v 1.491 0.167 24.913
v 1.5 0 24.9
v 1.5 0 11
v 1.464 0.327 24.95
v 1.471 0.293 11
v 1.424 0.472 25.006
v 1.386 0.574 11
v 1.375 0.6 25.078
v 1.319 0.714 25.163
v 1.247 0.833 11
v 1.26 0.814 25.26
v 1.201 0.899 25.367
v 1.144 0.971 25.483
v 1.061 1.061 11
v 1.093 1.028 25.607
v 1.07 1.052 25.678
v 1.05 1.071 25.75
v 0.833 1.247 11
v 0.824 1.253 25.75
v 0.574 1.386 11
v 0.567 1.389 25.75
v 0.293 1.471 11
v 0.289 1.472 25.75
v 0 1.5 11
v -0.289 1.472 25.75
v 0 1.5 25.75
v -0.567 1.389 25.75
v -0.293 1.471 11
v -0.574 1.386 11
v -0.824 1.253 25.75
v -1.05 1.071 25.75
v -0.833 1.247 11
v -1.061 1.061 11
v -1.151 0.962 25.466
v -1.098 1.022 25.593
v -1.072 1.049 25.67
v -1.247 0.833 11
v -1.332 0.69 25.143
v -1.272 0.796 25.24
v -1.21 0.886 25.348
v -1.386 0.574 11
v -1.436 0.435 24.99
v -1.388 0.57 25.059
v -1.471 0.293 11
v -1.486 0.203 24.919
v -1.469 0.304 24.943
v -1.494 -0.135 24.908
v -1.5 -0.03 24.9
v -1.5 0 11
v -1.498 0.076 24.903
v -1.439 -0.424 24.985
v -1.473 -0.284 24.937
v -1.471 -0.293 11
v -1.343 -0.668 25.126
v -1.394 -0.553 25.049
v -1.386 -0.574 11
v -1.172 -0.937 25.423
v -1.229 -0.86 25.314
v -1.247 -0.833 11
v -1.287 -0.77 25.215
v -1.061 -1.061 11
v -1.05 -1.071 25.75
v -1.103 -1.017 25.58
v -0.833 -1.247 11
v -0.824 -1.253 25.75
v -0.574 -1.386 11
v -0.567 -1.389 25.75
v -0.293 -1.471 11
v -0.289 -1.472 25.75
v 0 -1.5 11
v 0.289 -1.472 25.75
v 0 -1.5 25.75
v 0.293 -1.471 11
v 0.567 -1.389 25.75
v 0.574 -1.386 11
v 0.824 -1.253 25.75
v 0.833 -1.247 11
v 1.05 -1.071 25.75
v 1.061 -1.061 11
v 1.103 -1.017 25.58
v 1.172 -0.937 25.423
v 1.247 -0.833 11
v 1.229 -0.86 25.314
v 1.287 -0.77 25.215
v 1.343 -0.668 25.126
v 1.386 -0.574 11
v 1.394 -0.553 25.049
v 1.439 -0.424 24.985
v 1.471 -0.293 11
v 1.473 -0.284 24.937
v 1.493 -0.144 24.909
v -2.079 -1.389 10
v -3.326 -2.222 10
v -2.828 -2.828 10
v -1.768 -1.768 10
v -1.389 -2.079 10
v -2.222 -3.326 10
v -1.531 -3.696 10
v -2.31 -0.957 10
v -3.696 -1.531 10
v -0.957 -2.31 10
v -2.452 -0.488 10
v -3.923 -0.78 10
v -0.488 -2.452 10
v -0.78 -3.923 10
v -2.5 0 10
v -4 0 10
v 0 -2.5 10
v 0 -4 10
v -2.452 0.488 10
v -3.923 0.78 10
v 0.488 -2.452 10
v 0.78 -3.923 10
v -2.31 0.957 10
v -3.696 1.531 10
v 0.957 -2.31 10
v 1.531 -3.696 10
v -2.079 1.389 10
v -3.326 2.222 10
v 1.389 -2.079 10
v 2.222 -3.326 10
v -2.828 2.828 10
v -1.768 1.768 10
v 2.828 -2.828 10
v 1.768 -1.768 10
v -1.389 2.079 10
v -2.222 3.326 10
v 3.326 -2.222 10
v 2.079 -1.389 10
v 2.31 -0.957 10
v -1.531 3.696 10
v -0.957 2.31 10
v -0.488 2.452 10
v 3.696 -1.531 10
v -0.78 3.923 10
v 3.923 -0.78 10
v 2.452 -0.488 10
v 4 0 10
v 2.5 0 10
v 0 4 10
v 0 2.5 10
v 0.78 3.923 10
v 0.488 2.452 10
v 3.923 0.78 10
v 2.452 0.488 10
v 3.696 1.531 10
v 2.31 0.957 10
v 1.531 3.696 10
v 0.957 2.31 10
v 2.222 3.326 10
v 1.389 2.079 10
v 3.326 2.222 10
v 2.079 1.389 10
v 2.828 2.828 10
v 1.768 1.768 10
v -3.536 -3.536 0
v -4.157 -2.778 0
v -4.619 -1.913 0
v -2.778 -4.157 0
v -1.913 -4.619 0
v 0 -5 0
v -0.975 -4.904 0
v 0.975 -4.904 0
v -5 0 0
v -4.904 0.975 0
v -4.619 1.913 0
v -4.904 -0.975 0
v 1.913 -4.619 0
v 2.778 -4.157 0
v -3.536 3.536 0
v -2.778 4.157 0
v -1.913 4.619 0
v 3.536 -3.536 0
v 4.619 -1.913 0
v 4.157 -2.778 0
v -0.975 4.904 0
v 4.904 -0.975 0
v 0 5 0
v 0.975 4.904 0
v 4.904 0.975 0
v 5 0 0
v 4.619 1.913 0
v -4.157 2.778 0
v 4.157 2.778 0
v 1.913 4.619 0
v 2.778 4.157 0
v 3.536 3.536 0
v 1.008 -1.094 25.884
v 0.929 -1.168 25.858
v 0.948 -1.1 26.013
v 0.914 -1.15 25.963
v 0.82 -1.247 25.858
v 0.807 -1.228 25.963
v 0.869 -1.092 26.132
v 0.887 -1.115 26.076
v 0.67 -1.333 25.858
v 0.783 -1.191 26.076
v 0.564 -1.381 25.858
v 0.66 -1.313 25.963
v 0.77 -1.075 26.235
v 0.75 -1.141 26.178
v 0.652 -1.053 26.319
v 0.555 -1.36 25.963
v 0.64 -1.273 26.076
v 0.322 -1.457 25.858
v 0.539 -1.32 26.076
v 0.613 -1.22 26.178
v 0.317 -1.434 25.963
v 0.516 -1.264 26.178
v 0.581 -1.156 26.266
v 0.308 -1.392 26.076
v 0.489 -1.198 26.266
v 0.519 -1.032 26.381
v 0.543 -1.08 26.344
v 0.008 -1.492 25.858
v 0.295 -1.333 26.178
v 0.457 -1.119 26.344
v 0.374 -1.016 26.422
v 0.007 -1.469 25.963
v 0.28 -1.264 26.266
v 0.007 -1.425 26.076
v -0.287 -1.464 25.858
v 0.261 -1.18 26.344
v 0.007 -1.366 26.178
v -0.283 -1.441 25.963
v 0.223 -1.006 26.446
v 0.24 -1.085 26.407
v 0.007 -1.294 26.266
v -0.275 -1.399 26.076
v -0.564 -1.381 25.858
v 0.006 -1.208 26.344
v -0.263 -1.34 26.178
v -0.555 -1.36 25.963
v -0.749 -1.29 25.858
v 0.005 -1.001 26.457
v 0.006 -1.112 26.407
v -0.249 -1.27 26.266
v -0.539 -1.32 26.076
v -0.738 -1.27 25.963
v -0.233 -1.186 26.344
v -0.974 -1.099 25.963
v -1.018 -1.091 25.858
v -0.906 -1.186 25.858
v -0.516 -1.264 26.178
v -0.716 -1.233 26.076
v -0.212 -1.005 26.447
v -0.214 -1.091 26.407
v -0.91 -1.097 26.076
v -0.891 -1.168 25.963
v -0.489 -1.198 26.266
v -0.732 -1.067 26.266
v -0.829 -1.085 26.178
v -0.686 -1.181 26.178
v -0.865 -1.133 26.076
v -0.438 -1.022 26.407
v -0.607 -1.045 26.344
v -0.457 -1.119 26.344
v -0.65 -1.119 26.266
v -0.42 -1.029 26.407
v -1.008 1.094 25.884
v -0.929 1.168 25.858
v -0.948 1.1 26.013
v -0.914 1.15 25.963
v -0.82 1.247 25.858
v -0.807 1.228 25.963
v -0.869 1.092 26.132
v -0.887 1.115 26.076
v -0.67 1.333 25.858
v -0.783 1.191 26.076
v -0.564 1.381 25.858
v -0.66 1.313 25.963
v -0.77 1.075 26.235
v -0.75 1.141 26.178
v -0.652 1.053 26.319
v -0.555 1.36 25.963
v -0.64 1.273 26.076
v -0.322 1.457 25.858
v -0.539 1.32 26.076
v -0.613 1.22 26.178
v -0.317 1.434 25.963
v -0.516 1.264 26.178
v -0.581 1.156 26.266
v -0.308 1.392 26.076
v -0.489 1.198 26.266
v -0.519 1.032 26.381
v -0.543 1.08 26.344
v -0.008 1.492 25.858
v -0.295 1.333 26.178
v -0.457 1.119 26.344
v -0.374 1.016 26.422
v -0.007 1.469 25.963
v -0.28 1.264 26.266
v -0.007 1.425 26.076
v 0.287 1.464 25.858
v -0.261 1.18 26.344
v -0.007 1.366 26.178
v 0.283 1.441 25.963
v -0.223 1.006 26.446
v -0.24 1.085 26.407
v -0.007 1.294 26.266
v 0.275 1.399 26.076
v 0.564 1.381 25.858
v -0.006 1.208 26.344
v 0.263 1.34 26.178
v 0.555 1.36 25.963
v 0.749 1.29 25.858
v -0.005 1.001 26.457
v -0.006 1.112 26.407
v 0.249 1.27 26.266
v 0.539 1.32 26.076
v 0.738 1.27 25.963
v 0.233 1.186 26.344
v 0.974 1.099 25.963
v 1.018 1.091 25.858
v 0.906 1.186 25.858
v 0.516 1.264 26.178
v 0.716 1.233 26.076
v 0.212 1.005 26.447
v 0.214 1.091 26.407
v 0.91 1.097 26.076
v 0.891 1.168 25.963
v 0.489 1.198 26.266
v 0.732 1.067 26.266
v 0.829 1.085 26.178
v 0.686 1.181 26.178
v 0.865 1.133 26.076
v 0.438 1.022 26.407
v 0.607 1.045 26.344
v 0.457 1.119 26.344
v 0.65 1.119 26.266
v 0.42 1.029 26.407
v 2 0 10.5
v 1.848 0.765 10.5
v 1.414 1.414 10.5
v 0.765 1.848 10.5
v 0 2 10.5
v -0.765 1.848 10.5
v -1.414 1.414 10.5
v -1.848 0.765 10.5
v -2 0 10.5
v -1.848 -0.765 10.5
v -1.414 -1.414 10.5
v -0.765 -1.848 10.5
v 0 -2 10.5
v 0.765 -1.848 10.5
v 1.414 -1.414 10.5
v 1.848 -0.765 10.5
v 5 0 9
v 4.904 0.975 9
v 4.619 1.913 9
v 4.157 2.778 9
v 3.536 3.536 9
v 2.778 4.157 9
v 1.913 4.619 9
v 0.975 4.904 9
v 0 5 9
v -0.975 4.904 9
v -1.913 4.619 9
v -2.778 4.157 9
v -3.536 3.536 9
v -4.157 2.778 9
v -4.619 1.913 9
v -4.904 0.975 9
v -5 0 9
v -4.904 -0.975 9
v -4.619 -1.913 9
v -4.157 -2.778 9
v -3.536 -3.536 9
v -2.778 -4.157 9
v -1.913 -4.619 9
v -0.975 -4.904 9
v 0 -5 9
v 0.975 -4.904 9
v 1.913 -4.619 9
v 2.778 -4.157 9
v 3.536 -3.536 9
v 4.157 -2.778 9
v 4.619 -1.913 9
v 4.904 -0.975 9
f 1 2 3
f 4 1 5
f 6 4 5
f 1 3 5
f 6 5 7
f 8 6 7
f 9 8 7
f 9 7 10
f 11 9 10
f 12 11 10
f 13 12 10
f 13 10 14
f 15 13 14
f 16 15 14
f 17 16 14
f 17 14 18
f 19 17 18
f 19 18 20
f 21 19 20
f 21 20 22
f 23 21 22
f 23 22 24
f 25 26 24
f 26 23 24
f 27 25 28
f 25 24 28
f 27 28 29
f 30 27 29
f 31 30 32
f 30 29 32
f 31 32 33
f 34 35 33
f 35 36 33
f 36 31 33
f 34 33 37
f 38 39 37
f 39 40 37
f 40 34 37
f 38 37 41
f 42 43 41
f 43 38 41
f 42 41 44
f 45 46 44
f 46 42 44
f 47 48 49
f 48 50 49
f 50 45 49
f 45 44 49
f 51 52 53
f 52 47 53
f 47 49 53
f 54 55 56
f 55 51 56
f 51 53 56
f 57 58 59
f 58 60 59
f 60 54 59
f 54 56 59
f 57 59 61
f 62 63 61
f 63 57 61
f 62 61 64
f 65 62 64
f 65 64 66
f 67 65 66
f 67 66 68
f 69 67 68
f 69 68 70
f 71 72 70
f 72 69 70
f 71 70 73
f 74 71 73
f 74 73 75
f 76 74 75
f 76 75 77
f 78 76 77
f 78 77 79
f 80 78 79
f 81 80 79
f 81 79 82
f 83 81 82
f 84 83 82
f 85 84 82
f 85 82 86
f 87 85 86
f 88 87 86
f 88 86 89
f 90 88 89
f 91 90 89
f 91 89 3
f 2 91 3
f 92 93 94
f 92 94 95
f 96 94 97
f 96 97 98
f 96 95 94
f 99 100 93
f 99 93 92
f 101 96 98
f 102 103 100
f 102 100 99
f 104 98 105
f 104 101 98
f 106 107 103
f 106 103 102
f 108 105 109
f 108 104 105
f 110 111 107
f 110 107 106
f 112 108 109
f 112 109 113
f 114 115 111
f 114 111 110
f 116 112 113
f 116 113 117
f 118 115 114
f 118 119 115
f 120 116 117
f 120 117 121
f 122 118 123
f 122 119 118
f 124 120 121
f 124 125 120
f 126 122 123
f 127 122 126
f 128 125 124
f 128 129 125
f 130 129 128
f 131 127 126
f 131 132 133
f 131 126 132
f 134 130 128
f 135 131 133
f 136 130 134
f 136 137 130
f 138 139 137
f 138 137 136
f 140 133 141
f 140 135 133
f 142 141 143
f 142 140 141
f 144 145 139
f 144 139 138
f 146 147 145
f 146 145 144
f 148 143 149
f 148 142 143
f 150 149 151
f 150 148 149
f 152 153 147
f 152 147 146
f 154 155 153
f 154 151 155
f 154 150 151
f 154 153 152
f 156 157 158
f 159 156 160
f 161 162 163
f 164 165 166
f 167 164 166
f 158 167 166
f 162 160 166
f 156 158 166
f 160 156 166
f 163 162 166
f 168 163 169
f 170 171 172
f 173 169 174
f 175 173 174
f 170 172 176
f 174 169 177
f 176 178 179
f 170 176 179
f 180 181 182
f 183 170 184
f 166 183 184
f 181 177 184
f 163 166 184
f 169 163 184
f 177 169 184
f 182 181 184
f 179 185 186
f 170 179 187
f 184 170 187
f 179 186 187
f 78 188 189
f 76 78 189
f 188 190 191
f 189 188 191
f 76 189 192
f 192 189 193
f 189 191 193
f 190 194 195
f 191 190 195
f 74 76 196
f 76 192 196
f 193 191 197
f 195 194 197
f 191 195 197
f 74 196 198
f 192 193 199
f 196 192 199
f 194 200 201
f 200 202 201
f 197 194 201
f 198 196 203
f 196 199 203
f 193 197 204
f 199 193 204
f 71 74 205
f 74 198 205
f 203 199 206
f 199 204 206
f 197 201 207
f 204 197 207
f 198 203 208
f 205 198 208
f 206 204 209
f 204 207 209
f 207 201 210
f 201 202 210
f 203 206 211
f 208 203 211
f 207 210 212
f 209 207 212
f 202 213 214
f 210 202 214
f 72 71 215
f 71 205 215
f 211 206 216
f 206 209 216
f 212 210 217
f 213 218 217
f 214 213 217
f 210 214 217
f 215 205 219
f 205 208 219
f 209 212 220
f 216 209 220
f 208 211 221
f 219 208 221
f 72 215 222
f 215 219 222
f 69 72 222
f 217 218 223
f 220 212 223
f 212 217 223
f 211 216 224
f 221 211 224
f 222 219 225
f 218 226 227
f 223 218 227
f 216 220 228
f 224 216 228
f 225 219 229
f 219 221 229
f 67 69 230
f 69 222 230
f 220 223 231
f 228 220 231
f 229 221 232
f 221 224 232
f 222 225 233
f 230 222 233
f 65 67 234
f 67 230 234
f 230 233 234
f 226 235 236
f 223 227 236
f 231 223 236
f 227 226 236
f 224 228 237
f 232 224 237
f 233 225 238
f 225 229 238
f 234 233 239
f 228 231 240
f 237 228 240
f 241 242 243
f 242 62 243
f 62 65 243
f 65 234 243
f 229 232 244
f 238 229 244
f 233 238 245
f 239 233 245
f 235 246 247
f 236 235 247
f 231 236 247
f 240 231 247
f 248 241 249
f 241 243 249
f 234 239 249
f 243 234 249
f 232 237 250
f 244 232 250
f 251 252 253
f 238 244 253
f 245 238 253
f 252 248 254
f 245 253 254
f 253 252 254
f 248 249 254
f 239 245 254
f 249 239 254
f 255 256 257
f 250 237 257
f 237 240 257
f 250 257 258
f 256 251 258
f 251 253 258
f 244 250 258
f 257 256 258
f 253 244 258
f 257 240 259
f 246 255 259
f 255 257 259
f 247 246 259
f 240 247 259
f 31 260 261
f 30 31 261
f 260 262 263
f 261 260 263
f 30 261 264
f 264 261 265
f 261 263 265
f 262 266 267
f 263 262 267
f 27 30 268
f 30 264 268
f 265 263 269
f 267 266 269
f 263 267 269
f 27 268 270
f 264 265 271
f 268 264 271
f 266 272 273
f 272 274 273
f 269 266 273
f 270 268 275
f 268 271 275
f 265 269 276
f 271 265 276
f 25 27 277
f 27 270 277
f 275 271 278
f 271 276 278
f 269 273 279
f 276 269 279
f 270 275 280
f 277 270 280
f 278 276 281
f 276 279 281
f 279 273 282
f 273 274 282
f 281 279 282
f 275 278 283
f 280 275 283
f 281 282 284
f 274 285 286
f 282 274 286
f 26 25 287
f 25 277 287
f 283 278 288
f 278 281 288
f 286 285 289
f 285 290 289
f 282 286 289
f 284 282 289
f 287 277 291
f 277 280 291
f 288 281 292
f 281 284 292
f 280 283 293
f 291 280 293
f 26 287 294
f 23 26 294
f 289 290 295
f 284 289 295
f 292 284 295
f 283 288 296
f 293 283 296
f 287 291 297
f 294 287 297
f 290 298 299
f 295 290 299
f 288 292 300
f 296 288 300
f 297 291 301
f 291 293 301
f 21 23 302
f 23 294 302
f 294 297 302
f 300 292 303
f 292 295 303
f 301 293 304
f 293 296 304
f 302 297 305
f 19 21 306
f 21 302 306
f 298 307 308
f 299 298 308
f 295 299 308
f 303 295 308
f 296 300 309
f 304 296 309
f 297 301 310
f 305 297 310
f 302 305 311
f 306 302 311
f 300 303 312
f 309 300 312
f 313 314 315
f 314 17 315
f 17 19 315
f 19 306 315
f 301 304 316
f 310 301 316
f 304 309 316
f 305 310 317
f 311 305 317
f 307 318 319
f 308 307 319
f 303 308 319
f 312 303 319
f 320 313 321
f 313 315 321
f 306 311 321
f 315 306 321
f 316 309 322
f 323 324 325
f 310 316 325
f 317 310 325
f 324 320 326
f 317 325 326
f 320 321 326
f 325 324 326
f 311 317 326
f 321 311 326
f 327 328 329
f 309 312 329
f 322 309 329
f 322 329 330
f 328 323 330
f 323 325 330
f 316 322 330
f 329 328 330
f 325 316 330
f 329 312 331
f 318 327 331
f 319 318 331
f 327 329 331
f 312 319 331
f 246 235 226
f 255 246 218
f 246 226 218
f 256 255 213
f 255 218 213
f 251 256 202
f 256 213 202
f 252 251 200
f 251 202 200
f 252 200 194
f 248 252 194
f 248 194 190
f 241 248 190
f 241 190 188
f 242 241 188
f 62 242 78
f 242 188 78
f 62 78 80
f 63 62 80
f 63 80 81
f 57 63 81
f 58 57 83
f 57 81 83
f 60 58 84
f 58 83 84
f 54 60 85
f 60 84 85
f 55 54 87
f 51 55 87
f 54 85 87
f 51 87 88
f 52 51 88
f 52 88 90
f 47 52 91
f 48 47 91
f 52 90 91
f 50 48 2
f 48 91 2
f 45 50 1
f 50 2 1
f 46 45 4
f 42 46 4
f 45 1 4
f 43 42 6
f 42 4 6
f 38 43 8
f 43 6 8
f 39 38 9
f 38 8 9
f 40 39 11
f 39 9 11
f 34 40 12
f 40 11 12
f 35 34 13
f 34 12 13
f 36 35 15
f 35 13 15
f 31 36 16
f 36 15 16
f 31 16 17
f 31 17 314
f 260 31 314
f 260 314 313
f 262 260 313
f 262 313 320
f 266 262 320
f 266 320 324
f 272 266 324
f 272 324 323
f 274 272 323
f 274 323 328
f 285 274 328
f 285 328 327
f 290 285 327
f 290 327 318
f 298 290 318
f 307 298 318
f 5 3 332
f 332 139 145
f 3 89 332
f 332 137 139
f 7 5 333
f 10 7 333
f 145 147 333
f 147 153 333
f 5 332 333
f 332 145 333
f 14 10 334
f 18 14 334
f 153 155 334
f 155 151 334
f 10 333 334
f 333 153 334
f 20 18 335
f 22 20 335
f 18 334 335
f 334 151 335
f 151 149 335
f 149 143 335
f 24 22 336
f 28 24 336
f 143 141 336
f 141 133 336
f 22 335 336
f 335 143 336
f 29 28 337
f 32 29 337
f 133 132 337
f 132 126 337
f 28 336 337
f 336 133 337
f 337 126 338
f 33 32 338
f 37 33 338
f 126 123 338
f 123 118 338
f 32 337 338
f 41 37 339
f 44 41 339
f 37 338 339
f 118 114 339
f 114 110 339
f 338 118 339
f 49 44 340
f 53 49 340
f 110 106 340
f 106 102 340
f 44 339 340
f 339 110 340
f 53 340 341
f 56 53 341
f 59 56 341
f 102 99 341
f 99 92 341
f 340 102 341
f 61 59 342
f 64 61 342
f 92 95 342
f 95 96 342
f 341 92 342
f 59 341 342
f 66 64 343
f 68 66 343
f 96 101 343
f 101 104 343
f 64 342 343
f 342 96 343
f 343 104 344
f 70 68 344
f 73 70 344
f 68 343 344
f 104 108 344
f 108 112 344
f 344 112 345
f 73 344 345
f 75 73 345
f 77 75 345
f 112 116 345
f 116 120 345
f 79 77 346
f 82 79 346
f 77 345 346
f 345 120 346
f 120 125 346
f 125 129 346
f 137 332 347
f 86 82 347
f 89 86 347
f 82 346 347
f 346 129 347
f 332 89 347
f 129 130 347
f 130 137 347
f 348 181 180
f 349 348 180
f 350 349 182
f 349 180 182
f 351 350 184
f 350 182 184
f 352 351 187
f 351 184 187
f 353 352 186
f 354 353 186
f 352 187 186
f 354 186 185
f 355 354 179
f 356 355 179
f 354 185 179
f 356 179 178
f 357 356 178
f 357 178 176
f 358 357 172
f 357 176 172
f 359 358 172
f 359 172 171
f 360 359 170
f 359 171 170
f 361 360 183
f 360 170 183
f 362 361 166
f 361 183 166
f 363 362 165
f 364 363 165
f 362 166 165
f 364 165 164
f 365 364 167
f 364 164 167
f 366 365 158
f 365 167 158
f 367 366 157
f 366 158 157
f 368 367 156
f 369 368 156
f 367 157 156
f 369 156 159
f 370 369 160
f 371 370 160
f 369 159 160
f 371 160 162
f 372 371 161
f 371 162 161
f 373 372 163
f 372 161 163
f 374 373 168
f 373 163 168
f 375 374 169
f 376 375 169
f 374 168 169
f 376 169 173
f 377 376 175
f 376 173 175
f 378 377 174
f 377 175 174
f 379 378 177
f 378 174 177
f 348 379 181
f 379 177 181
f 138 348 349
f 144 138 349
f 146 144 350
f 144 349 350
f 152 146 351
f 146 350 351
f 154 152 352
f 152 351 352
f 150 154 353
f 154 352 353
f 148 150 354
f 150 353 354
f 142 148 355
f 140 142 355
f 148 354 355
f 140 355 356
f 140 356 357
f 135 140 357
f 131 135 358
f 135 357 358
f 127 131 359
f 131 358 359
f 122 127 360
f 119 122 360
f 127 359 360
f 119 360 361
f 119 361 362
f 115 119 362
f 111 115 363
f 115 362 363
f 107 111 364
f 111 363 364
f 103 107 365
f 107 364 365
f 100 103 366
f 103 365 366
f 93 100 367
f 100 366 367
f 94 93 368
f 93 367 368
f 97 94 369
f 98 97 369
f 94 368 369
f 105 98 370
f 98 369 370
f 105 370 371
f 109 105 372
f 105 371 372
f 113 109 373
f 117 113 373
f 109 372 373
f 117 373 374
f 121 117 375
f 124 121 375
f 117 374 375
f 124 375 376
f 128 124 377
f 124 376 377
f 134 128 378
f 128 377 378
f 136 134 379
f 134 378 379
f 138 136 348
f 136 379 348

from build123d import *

# Parameters (mm, degrees)
F0_R        = 5
F1_DEPTH    = 10
F2_R        = 1.5
F3_DEPTH    = 16
F7_SIZE     = 1
F8_DEPTH    = 12.5
F9_T2_ANGLE = 245.2760469103
F9_T4_ANGLE = 245.2760469103


# Not quite as in the source:
# - a fillet or chamfer that OpenCascade refuses, or shapes differently, is made with other operations: its cross-section is extruded or revolved along the edge and cut away or added


with BuildPart() as f1:
    # F0 (on Top) → F1 (new body)
    with BuildSketch(Plane.XY):
        Circle(F0_R)
    extrude(amount=F1_DEPTH)

    # F2 (on face) → F3 (join)
    with BuildSketch(Plane.XY.offset(10)):
        Circle(F2_R)
    extrude(amount=F3_DEPTH)

    # F4 (on Right) → F5 (revolve)
    with BuildSketch(Plane.YZ):
        with BuildLine():
            ThreePointArc((1.5, 26), (0, 27.5), (-1.5, 26))
            Line((-1.5, 26), (1.5, 26))
        make_face()
    revolve(axis=Axis((0, 0, 26), (0, 1, 0)))

    # F7
    f7_edges = [f1.edges().sort_by_distance(p)[0] for p in [
        (-5, 0, 10),
        (-1.5, 0, 10),
    ]]
    chamfer(f7_edges, length=F7_SIZE)

    # F6 (on Right) → F8 (cut, symmetric)
    with BuildSketch(Plane.YZ):
        with BuildLine():
            Line((-1.4142135624, 26.5), (-0.9797958971, 26.5))
            ThreePointArc((-0.9797958971, 26.5), (0, 24.9), (0.9797958971, 26.5))
            Line((0.9797958971, 26.5), (1.4142135624, 26.5))
            ThreePointArc((1.4142135624, 26.5), (0, 27.5), (-1.4142135624, 26.5))
        make_face()
    extrude(amount=F8_DEPTH, both=True, mode=Mode.SUBTRACT)

    # F9: fillet of radius 0.75 on 2 edges, made by hand

    # F9_s1 → F9_t2 (revolve, cut)
    with BuildSketch(Plane(origin=(0, 0, 0), x_dir=(0, 0, 1), z_dir=(0.5393297468, -0.8420946646, 0))):
        with BuildLine():
            ThreePointArc((25.75, 1.5), (26.2803300859, 1.2803300859), (26.5, 0.75))
            Line((26.5, 0.75), (26.575, 0.75))
            Line((26.575, 0.75), (26.575, 1.4142135624))
            Line((26.575, 1.4142135624), (26.525, 1.4849242405))
            ThreePointArc((26.525, 1.4849242405), (26, 1.575), (25.75, 1.575))
            Line((25.75, 1.575), (25.75, 1.5))
        make_face()
    revolve(axis=Axis((0, 0, 26.5), (0, 0, -1)), revolution_arc=F9_T2_ANGLE, mode=Mode.SUBTRACT)

    # F9_s3 → F9_t4 (revolve, cut)
    with BuildSketch(Plane(origin=(0, 0, 0), x_dir=(0, 0, 1), z_dir=(-0.5393297468, 0.8420946646, 0))):
        with BuildLine():
            ThreePointArc((25.75, 1.5), (26.2803300859, 1.2803300859), (26.5, 0.75))
            Line((26.5, 0.75), (26.575, 0.75))
            Line((26.575, 0.75), (26.575, 1.4142135624))
            Line((26.575, 1.4142135624), (26.525, 1.4849242405))
            ThreePointArc((26.525, 1.4849242405), (26, 1.575), (25.75, 1.575))
            Line((25.75, 1.575), (25.75, 1.5))
        make_face()
    revolve(axis=Axis((0, 0, 26.5), (0, 0, -1)), revolution_arc=F9_T4_ANGLE, mode=Mode.SUBTRACT)


solid = f1.part
